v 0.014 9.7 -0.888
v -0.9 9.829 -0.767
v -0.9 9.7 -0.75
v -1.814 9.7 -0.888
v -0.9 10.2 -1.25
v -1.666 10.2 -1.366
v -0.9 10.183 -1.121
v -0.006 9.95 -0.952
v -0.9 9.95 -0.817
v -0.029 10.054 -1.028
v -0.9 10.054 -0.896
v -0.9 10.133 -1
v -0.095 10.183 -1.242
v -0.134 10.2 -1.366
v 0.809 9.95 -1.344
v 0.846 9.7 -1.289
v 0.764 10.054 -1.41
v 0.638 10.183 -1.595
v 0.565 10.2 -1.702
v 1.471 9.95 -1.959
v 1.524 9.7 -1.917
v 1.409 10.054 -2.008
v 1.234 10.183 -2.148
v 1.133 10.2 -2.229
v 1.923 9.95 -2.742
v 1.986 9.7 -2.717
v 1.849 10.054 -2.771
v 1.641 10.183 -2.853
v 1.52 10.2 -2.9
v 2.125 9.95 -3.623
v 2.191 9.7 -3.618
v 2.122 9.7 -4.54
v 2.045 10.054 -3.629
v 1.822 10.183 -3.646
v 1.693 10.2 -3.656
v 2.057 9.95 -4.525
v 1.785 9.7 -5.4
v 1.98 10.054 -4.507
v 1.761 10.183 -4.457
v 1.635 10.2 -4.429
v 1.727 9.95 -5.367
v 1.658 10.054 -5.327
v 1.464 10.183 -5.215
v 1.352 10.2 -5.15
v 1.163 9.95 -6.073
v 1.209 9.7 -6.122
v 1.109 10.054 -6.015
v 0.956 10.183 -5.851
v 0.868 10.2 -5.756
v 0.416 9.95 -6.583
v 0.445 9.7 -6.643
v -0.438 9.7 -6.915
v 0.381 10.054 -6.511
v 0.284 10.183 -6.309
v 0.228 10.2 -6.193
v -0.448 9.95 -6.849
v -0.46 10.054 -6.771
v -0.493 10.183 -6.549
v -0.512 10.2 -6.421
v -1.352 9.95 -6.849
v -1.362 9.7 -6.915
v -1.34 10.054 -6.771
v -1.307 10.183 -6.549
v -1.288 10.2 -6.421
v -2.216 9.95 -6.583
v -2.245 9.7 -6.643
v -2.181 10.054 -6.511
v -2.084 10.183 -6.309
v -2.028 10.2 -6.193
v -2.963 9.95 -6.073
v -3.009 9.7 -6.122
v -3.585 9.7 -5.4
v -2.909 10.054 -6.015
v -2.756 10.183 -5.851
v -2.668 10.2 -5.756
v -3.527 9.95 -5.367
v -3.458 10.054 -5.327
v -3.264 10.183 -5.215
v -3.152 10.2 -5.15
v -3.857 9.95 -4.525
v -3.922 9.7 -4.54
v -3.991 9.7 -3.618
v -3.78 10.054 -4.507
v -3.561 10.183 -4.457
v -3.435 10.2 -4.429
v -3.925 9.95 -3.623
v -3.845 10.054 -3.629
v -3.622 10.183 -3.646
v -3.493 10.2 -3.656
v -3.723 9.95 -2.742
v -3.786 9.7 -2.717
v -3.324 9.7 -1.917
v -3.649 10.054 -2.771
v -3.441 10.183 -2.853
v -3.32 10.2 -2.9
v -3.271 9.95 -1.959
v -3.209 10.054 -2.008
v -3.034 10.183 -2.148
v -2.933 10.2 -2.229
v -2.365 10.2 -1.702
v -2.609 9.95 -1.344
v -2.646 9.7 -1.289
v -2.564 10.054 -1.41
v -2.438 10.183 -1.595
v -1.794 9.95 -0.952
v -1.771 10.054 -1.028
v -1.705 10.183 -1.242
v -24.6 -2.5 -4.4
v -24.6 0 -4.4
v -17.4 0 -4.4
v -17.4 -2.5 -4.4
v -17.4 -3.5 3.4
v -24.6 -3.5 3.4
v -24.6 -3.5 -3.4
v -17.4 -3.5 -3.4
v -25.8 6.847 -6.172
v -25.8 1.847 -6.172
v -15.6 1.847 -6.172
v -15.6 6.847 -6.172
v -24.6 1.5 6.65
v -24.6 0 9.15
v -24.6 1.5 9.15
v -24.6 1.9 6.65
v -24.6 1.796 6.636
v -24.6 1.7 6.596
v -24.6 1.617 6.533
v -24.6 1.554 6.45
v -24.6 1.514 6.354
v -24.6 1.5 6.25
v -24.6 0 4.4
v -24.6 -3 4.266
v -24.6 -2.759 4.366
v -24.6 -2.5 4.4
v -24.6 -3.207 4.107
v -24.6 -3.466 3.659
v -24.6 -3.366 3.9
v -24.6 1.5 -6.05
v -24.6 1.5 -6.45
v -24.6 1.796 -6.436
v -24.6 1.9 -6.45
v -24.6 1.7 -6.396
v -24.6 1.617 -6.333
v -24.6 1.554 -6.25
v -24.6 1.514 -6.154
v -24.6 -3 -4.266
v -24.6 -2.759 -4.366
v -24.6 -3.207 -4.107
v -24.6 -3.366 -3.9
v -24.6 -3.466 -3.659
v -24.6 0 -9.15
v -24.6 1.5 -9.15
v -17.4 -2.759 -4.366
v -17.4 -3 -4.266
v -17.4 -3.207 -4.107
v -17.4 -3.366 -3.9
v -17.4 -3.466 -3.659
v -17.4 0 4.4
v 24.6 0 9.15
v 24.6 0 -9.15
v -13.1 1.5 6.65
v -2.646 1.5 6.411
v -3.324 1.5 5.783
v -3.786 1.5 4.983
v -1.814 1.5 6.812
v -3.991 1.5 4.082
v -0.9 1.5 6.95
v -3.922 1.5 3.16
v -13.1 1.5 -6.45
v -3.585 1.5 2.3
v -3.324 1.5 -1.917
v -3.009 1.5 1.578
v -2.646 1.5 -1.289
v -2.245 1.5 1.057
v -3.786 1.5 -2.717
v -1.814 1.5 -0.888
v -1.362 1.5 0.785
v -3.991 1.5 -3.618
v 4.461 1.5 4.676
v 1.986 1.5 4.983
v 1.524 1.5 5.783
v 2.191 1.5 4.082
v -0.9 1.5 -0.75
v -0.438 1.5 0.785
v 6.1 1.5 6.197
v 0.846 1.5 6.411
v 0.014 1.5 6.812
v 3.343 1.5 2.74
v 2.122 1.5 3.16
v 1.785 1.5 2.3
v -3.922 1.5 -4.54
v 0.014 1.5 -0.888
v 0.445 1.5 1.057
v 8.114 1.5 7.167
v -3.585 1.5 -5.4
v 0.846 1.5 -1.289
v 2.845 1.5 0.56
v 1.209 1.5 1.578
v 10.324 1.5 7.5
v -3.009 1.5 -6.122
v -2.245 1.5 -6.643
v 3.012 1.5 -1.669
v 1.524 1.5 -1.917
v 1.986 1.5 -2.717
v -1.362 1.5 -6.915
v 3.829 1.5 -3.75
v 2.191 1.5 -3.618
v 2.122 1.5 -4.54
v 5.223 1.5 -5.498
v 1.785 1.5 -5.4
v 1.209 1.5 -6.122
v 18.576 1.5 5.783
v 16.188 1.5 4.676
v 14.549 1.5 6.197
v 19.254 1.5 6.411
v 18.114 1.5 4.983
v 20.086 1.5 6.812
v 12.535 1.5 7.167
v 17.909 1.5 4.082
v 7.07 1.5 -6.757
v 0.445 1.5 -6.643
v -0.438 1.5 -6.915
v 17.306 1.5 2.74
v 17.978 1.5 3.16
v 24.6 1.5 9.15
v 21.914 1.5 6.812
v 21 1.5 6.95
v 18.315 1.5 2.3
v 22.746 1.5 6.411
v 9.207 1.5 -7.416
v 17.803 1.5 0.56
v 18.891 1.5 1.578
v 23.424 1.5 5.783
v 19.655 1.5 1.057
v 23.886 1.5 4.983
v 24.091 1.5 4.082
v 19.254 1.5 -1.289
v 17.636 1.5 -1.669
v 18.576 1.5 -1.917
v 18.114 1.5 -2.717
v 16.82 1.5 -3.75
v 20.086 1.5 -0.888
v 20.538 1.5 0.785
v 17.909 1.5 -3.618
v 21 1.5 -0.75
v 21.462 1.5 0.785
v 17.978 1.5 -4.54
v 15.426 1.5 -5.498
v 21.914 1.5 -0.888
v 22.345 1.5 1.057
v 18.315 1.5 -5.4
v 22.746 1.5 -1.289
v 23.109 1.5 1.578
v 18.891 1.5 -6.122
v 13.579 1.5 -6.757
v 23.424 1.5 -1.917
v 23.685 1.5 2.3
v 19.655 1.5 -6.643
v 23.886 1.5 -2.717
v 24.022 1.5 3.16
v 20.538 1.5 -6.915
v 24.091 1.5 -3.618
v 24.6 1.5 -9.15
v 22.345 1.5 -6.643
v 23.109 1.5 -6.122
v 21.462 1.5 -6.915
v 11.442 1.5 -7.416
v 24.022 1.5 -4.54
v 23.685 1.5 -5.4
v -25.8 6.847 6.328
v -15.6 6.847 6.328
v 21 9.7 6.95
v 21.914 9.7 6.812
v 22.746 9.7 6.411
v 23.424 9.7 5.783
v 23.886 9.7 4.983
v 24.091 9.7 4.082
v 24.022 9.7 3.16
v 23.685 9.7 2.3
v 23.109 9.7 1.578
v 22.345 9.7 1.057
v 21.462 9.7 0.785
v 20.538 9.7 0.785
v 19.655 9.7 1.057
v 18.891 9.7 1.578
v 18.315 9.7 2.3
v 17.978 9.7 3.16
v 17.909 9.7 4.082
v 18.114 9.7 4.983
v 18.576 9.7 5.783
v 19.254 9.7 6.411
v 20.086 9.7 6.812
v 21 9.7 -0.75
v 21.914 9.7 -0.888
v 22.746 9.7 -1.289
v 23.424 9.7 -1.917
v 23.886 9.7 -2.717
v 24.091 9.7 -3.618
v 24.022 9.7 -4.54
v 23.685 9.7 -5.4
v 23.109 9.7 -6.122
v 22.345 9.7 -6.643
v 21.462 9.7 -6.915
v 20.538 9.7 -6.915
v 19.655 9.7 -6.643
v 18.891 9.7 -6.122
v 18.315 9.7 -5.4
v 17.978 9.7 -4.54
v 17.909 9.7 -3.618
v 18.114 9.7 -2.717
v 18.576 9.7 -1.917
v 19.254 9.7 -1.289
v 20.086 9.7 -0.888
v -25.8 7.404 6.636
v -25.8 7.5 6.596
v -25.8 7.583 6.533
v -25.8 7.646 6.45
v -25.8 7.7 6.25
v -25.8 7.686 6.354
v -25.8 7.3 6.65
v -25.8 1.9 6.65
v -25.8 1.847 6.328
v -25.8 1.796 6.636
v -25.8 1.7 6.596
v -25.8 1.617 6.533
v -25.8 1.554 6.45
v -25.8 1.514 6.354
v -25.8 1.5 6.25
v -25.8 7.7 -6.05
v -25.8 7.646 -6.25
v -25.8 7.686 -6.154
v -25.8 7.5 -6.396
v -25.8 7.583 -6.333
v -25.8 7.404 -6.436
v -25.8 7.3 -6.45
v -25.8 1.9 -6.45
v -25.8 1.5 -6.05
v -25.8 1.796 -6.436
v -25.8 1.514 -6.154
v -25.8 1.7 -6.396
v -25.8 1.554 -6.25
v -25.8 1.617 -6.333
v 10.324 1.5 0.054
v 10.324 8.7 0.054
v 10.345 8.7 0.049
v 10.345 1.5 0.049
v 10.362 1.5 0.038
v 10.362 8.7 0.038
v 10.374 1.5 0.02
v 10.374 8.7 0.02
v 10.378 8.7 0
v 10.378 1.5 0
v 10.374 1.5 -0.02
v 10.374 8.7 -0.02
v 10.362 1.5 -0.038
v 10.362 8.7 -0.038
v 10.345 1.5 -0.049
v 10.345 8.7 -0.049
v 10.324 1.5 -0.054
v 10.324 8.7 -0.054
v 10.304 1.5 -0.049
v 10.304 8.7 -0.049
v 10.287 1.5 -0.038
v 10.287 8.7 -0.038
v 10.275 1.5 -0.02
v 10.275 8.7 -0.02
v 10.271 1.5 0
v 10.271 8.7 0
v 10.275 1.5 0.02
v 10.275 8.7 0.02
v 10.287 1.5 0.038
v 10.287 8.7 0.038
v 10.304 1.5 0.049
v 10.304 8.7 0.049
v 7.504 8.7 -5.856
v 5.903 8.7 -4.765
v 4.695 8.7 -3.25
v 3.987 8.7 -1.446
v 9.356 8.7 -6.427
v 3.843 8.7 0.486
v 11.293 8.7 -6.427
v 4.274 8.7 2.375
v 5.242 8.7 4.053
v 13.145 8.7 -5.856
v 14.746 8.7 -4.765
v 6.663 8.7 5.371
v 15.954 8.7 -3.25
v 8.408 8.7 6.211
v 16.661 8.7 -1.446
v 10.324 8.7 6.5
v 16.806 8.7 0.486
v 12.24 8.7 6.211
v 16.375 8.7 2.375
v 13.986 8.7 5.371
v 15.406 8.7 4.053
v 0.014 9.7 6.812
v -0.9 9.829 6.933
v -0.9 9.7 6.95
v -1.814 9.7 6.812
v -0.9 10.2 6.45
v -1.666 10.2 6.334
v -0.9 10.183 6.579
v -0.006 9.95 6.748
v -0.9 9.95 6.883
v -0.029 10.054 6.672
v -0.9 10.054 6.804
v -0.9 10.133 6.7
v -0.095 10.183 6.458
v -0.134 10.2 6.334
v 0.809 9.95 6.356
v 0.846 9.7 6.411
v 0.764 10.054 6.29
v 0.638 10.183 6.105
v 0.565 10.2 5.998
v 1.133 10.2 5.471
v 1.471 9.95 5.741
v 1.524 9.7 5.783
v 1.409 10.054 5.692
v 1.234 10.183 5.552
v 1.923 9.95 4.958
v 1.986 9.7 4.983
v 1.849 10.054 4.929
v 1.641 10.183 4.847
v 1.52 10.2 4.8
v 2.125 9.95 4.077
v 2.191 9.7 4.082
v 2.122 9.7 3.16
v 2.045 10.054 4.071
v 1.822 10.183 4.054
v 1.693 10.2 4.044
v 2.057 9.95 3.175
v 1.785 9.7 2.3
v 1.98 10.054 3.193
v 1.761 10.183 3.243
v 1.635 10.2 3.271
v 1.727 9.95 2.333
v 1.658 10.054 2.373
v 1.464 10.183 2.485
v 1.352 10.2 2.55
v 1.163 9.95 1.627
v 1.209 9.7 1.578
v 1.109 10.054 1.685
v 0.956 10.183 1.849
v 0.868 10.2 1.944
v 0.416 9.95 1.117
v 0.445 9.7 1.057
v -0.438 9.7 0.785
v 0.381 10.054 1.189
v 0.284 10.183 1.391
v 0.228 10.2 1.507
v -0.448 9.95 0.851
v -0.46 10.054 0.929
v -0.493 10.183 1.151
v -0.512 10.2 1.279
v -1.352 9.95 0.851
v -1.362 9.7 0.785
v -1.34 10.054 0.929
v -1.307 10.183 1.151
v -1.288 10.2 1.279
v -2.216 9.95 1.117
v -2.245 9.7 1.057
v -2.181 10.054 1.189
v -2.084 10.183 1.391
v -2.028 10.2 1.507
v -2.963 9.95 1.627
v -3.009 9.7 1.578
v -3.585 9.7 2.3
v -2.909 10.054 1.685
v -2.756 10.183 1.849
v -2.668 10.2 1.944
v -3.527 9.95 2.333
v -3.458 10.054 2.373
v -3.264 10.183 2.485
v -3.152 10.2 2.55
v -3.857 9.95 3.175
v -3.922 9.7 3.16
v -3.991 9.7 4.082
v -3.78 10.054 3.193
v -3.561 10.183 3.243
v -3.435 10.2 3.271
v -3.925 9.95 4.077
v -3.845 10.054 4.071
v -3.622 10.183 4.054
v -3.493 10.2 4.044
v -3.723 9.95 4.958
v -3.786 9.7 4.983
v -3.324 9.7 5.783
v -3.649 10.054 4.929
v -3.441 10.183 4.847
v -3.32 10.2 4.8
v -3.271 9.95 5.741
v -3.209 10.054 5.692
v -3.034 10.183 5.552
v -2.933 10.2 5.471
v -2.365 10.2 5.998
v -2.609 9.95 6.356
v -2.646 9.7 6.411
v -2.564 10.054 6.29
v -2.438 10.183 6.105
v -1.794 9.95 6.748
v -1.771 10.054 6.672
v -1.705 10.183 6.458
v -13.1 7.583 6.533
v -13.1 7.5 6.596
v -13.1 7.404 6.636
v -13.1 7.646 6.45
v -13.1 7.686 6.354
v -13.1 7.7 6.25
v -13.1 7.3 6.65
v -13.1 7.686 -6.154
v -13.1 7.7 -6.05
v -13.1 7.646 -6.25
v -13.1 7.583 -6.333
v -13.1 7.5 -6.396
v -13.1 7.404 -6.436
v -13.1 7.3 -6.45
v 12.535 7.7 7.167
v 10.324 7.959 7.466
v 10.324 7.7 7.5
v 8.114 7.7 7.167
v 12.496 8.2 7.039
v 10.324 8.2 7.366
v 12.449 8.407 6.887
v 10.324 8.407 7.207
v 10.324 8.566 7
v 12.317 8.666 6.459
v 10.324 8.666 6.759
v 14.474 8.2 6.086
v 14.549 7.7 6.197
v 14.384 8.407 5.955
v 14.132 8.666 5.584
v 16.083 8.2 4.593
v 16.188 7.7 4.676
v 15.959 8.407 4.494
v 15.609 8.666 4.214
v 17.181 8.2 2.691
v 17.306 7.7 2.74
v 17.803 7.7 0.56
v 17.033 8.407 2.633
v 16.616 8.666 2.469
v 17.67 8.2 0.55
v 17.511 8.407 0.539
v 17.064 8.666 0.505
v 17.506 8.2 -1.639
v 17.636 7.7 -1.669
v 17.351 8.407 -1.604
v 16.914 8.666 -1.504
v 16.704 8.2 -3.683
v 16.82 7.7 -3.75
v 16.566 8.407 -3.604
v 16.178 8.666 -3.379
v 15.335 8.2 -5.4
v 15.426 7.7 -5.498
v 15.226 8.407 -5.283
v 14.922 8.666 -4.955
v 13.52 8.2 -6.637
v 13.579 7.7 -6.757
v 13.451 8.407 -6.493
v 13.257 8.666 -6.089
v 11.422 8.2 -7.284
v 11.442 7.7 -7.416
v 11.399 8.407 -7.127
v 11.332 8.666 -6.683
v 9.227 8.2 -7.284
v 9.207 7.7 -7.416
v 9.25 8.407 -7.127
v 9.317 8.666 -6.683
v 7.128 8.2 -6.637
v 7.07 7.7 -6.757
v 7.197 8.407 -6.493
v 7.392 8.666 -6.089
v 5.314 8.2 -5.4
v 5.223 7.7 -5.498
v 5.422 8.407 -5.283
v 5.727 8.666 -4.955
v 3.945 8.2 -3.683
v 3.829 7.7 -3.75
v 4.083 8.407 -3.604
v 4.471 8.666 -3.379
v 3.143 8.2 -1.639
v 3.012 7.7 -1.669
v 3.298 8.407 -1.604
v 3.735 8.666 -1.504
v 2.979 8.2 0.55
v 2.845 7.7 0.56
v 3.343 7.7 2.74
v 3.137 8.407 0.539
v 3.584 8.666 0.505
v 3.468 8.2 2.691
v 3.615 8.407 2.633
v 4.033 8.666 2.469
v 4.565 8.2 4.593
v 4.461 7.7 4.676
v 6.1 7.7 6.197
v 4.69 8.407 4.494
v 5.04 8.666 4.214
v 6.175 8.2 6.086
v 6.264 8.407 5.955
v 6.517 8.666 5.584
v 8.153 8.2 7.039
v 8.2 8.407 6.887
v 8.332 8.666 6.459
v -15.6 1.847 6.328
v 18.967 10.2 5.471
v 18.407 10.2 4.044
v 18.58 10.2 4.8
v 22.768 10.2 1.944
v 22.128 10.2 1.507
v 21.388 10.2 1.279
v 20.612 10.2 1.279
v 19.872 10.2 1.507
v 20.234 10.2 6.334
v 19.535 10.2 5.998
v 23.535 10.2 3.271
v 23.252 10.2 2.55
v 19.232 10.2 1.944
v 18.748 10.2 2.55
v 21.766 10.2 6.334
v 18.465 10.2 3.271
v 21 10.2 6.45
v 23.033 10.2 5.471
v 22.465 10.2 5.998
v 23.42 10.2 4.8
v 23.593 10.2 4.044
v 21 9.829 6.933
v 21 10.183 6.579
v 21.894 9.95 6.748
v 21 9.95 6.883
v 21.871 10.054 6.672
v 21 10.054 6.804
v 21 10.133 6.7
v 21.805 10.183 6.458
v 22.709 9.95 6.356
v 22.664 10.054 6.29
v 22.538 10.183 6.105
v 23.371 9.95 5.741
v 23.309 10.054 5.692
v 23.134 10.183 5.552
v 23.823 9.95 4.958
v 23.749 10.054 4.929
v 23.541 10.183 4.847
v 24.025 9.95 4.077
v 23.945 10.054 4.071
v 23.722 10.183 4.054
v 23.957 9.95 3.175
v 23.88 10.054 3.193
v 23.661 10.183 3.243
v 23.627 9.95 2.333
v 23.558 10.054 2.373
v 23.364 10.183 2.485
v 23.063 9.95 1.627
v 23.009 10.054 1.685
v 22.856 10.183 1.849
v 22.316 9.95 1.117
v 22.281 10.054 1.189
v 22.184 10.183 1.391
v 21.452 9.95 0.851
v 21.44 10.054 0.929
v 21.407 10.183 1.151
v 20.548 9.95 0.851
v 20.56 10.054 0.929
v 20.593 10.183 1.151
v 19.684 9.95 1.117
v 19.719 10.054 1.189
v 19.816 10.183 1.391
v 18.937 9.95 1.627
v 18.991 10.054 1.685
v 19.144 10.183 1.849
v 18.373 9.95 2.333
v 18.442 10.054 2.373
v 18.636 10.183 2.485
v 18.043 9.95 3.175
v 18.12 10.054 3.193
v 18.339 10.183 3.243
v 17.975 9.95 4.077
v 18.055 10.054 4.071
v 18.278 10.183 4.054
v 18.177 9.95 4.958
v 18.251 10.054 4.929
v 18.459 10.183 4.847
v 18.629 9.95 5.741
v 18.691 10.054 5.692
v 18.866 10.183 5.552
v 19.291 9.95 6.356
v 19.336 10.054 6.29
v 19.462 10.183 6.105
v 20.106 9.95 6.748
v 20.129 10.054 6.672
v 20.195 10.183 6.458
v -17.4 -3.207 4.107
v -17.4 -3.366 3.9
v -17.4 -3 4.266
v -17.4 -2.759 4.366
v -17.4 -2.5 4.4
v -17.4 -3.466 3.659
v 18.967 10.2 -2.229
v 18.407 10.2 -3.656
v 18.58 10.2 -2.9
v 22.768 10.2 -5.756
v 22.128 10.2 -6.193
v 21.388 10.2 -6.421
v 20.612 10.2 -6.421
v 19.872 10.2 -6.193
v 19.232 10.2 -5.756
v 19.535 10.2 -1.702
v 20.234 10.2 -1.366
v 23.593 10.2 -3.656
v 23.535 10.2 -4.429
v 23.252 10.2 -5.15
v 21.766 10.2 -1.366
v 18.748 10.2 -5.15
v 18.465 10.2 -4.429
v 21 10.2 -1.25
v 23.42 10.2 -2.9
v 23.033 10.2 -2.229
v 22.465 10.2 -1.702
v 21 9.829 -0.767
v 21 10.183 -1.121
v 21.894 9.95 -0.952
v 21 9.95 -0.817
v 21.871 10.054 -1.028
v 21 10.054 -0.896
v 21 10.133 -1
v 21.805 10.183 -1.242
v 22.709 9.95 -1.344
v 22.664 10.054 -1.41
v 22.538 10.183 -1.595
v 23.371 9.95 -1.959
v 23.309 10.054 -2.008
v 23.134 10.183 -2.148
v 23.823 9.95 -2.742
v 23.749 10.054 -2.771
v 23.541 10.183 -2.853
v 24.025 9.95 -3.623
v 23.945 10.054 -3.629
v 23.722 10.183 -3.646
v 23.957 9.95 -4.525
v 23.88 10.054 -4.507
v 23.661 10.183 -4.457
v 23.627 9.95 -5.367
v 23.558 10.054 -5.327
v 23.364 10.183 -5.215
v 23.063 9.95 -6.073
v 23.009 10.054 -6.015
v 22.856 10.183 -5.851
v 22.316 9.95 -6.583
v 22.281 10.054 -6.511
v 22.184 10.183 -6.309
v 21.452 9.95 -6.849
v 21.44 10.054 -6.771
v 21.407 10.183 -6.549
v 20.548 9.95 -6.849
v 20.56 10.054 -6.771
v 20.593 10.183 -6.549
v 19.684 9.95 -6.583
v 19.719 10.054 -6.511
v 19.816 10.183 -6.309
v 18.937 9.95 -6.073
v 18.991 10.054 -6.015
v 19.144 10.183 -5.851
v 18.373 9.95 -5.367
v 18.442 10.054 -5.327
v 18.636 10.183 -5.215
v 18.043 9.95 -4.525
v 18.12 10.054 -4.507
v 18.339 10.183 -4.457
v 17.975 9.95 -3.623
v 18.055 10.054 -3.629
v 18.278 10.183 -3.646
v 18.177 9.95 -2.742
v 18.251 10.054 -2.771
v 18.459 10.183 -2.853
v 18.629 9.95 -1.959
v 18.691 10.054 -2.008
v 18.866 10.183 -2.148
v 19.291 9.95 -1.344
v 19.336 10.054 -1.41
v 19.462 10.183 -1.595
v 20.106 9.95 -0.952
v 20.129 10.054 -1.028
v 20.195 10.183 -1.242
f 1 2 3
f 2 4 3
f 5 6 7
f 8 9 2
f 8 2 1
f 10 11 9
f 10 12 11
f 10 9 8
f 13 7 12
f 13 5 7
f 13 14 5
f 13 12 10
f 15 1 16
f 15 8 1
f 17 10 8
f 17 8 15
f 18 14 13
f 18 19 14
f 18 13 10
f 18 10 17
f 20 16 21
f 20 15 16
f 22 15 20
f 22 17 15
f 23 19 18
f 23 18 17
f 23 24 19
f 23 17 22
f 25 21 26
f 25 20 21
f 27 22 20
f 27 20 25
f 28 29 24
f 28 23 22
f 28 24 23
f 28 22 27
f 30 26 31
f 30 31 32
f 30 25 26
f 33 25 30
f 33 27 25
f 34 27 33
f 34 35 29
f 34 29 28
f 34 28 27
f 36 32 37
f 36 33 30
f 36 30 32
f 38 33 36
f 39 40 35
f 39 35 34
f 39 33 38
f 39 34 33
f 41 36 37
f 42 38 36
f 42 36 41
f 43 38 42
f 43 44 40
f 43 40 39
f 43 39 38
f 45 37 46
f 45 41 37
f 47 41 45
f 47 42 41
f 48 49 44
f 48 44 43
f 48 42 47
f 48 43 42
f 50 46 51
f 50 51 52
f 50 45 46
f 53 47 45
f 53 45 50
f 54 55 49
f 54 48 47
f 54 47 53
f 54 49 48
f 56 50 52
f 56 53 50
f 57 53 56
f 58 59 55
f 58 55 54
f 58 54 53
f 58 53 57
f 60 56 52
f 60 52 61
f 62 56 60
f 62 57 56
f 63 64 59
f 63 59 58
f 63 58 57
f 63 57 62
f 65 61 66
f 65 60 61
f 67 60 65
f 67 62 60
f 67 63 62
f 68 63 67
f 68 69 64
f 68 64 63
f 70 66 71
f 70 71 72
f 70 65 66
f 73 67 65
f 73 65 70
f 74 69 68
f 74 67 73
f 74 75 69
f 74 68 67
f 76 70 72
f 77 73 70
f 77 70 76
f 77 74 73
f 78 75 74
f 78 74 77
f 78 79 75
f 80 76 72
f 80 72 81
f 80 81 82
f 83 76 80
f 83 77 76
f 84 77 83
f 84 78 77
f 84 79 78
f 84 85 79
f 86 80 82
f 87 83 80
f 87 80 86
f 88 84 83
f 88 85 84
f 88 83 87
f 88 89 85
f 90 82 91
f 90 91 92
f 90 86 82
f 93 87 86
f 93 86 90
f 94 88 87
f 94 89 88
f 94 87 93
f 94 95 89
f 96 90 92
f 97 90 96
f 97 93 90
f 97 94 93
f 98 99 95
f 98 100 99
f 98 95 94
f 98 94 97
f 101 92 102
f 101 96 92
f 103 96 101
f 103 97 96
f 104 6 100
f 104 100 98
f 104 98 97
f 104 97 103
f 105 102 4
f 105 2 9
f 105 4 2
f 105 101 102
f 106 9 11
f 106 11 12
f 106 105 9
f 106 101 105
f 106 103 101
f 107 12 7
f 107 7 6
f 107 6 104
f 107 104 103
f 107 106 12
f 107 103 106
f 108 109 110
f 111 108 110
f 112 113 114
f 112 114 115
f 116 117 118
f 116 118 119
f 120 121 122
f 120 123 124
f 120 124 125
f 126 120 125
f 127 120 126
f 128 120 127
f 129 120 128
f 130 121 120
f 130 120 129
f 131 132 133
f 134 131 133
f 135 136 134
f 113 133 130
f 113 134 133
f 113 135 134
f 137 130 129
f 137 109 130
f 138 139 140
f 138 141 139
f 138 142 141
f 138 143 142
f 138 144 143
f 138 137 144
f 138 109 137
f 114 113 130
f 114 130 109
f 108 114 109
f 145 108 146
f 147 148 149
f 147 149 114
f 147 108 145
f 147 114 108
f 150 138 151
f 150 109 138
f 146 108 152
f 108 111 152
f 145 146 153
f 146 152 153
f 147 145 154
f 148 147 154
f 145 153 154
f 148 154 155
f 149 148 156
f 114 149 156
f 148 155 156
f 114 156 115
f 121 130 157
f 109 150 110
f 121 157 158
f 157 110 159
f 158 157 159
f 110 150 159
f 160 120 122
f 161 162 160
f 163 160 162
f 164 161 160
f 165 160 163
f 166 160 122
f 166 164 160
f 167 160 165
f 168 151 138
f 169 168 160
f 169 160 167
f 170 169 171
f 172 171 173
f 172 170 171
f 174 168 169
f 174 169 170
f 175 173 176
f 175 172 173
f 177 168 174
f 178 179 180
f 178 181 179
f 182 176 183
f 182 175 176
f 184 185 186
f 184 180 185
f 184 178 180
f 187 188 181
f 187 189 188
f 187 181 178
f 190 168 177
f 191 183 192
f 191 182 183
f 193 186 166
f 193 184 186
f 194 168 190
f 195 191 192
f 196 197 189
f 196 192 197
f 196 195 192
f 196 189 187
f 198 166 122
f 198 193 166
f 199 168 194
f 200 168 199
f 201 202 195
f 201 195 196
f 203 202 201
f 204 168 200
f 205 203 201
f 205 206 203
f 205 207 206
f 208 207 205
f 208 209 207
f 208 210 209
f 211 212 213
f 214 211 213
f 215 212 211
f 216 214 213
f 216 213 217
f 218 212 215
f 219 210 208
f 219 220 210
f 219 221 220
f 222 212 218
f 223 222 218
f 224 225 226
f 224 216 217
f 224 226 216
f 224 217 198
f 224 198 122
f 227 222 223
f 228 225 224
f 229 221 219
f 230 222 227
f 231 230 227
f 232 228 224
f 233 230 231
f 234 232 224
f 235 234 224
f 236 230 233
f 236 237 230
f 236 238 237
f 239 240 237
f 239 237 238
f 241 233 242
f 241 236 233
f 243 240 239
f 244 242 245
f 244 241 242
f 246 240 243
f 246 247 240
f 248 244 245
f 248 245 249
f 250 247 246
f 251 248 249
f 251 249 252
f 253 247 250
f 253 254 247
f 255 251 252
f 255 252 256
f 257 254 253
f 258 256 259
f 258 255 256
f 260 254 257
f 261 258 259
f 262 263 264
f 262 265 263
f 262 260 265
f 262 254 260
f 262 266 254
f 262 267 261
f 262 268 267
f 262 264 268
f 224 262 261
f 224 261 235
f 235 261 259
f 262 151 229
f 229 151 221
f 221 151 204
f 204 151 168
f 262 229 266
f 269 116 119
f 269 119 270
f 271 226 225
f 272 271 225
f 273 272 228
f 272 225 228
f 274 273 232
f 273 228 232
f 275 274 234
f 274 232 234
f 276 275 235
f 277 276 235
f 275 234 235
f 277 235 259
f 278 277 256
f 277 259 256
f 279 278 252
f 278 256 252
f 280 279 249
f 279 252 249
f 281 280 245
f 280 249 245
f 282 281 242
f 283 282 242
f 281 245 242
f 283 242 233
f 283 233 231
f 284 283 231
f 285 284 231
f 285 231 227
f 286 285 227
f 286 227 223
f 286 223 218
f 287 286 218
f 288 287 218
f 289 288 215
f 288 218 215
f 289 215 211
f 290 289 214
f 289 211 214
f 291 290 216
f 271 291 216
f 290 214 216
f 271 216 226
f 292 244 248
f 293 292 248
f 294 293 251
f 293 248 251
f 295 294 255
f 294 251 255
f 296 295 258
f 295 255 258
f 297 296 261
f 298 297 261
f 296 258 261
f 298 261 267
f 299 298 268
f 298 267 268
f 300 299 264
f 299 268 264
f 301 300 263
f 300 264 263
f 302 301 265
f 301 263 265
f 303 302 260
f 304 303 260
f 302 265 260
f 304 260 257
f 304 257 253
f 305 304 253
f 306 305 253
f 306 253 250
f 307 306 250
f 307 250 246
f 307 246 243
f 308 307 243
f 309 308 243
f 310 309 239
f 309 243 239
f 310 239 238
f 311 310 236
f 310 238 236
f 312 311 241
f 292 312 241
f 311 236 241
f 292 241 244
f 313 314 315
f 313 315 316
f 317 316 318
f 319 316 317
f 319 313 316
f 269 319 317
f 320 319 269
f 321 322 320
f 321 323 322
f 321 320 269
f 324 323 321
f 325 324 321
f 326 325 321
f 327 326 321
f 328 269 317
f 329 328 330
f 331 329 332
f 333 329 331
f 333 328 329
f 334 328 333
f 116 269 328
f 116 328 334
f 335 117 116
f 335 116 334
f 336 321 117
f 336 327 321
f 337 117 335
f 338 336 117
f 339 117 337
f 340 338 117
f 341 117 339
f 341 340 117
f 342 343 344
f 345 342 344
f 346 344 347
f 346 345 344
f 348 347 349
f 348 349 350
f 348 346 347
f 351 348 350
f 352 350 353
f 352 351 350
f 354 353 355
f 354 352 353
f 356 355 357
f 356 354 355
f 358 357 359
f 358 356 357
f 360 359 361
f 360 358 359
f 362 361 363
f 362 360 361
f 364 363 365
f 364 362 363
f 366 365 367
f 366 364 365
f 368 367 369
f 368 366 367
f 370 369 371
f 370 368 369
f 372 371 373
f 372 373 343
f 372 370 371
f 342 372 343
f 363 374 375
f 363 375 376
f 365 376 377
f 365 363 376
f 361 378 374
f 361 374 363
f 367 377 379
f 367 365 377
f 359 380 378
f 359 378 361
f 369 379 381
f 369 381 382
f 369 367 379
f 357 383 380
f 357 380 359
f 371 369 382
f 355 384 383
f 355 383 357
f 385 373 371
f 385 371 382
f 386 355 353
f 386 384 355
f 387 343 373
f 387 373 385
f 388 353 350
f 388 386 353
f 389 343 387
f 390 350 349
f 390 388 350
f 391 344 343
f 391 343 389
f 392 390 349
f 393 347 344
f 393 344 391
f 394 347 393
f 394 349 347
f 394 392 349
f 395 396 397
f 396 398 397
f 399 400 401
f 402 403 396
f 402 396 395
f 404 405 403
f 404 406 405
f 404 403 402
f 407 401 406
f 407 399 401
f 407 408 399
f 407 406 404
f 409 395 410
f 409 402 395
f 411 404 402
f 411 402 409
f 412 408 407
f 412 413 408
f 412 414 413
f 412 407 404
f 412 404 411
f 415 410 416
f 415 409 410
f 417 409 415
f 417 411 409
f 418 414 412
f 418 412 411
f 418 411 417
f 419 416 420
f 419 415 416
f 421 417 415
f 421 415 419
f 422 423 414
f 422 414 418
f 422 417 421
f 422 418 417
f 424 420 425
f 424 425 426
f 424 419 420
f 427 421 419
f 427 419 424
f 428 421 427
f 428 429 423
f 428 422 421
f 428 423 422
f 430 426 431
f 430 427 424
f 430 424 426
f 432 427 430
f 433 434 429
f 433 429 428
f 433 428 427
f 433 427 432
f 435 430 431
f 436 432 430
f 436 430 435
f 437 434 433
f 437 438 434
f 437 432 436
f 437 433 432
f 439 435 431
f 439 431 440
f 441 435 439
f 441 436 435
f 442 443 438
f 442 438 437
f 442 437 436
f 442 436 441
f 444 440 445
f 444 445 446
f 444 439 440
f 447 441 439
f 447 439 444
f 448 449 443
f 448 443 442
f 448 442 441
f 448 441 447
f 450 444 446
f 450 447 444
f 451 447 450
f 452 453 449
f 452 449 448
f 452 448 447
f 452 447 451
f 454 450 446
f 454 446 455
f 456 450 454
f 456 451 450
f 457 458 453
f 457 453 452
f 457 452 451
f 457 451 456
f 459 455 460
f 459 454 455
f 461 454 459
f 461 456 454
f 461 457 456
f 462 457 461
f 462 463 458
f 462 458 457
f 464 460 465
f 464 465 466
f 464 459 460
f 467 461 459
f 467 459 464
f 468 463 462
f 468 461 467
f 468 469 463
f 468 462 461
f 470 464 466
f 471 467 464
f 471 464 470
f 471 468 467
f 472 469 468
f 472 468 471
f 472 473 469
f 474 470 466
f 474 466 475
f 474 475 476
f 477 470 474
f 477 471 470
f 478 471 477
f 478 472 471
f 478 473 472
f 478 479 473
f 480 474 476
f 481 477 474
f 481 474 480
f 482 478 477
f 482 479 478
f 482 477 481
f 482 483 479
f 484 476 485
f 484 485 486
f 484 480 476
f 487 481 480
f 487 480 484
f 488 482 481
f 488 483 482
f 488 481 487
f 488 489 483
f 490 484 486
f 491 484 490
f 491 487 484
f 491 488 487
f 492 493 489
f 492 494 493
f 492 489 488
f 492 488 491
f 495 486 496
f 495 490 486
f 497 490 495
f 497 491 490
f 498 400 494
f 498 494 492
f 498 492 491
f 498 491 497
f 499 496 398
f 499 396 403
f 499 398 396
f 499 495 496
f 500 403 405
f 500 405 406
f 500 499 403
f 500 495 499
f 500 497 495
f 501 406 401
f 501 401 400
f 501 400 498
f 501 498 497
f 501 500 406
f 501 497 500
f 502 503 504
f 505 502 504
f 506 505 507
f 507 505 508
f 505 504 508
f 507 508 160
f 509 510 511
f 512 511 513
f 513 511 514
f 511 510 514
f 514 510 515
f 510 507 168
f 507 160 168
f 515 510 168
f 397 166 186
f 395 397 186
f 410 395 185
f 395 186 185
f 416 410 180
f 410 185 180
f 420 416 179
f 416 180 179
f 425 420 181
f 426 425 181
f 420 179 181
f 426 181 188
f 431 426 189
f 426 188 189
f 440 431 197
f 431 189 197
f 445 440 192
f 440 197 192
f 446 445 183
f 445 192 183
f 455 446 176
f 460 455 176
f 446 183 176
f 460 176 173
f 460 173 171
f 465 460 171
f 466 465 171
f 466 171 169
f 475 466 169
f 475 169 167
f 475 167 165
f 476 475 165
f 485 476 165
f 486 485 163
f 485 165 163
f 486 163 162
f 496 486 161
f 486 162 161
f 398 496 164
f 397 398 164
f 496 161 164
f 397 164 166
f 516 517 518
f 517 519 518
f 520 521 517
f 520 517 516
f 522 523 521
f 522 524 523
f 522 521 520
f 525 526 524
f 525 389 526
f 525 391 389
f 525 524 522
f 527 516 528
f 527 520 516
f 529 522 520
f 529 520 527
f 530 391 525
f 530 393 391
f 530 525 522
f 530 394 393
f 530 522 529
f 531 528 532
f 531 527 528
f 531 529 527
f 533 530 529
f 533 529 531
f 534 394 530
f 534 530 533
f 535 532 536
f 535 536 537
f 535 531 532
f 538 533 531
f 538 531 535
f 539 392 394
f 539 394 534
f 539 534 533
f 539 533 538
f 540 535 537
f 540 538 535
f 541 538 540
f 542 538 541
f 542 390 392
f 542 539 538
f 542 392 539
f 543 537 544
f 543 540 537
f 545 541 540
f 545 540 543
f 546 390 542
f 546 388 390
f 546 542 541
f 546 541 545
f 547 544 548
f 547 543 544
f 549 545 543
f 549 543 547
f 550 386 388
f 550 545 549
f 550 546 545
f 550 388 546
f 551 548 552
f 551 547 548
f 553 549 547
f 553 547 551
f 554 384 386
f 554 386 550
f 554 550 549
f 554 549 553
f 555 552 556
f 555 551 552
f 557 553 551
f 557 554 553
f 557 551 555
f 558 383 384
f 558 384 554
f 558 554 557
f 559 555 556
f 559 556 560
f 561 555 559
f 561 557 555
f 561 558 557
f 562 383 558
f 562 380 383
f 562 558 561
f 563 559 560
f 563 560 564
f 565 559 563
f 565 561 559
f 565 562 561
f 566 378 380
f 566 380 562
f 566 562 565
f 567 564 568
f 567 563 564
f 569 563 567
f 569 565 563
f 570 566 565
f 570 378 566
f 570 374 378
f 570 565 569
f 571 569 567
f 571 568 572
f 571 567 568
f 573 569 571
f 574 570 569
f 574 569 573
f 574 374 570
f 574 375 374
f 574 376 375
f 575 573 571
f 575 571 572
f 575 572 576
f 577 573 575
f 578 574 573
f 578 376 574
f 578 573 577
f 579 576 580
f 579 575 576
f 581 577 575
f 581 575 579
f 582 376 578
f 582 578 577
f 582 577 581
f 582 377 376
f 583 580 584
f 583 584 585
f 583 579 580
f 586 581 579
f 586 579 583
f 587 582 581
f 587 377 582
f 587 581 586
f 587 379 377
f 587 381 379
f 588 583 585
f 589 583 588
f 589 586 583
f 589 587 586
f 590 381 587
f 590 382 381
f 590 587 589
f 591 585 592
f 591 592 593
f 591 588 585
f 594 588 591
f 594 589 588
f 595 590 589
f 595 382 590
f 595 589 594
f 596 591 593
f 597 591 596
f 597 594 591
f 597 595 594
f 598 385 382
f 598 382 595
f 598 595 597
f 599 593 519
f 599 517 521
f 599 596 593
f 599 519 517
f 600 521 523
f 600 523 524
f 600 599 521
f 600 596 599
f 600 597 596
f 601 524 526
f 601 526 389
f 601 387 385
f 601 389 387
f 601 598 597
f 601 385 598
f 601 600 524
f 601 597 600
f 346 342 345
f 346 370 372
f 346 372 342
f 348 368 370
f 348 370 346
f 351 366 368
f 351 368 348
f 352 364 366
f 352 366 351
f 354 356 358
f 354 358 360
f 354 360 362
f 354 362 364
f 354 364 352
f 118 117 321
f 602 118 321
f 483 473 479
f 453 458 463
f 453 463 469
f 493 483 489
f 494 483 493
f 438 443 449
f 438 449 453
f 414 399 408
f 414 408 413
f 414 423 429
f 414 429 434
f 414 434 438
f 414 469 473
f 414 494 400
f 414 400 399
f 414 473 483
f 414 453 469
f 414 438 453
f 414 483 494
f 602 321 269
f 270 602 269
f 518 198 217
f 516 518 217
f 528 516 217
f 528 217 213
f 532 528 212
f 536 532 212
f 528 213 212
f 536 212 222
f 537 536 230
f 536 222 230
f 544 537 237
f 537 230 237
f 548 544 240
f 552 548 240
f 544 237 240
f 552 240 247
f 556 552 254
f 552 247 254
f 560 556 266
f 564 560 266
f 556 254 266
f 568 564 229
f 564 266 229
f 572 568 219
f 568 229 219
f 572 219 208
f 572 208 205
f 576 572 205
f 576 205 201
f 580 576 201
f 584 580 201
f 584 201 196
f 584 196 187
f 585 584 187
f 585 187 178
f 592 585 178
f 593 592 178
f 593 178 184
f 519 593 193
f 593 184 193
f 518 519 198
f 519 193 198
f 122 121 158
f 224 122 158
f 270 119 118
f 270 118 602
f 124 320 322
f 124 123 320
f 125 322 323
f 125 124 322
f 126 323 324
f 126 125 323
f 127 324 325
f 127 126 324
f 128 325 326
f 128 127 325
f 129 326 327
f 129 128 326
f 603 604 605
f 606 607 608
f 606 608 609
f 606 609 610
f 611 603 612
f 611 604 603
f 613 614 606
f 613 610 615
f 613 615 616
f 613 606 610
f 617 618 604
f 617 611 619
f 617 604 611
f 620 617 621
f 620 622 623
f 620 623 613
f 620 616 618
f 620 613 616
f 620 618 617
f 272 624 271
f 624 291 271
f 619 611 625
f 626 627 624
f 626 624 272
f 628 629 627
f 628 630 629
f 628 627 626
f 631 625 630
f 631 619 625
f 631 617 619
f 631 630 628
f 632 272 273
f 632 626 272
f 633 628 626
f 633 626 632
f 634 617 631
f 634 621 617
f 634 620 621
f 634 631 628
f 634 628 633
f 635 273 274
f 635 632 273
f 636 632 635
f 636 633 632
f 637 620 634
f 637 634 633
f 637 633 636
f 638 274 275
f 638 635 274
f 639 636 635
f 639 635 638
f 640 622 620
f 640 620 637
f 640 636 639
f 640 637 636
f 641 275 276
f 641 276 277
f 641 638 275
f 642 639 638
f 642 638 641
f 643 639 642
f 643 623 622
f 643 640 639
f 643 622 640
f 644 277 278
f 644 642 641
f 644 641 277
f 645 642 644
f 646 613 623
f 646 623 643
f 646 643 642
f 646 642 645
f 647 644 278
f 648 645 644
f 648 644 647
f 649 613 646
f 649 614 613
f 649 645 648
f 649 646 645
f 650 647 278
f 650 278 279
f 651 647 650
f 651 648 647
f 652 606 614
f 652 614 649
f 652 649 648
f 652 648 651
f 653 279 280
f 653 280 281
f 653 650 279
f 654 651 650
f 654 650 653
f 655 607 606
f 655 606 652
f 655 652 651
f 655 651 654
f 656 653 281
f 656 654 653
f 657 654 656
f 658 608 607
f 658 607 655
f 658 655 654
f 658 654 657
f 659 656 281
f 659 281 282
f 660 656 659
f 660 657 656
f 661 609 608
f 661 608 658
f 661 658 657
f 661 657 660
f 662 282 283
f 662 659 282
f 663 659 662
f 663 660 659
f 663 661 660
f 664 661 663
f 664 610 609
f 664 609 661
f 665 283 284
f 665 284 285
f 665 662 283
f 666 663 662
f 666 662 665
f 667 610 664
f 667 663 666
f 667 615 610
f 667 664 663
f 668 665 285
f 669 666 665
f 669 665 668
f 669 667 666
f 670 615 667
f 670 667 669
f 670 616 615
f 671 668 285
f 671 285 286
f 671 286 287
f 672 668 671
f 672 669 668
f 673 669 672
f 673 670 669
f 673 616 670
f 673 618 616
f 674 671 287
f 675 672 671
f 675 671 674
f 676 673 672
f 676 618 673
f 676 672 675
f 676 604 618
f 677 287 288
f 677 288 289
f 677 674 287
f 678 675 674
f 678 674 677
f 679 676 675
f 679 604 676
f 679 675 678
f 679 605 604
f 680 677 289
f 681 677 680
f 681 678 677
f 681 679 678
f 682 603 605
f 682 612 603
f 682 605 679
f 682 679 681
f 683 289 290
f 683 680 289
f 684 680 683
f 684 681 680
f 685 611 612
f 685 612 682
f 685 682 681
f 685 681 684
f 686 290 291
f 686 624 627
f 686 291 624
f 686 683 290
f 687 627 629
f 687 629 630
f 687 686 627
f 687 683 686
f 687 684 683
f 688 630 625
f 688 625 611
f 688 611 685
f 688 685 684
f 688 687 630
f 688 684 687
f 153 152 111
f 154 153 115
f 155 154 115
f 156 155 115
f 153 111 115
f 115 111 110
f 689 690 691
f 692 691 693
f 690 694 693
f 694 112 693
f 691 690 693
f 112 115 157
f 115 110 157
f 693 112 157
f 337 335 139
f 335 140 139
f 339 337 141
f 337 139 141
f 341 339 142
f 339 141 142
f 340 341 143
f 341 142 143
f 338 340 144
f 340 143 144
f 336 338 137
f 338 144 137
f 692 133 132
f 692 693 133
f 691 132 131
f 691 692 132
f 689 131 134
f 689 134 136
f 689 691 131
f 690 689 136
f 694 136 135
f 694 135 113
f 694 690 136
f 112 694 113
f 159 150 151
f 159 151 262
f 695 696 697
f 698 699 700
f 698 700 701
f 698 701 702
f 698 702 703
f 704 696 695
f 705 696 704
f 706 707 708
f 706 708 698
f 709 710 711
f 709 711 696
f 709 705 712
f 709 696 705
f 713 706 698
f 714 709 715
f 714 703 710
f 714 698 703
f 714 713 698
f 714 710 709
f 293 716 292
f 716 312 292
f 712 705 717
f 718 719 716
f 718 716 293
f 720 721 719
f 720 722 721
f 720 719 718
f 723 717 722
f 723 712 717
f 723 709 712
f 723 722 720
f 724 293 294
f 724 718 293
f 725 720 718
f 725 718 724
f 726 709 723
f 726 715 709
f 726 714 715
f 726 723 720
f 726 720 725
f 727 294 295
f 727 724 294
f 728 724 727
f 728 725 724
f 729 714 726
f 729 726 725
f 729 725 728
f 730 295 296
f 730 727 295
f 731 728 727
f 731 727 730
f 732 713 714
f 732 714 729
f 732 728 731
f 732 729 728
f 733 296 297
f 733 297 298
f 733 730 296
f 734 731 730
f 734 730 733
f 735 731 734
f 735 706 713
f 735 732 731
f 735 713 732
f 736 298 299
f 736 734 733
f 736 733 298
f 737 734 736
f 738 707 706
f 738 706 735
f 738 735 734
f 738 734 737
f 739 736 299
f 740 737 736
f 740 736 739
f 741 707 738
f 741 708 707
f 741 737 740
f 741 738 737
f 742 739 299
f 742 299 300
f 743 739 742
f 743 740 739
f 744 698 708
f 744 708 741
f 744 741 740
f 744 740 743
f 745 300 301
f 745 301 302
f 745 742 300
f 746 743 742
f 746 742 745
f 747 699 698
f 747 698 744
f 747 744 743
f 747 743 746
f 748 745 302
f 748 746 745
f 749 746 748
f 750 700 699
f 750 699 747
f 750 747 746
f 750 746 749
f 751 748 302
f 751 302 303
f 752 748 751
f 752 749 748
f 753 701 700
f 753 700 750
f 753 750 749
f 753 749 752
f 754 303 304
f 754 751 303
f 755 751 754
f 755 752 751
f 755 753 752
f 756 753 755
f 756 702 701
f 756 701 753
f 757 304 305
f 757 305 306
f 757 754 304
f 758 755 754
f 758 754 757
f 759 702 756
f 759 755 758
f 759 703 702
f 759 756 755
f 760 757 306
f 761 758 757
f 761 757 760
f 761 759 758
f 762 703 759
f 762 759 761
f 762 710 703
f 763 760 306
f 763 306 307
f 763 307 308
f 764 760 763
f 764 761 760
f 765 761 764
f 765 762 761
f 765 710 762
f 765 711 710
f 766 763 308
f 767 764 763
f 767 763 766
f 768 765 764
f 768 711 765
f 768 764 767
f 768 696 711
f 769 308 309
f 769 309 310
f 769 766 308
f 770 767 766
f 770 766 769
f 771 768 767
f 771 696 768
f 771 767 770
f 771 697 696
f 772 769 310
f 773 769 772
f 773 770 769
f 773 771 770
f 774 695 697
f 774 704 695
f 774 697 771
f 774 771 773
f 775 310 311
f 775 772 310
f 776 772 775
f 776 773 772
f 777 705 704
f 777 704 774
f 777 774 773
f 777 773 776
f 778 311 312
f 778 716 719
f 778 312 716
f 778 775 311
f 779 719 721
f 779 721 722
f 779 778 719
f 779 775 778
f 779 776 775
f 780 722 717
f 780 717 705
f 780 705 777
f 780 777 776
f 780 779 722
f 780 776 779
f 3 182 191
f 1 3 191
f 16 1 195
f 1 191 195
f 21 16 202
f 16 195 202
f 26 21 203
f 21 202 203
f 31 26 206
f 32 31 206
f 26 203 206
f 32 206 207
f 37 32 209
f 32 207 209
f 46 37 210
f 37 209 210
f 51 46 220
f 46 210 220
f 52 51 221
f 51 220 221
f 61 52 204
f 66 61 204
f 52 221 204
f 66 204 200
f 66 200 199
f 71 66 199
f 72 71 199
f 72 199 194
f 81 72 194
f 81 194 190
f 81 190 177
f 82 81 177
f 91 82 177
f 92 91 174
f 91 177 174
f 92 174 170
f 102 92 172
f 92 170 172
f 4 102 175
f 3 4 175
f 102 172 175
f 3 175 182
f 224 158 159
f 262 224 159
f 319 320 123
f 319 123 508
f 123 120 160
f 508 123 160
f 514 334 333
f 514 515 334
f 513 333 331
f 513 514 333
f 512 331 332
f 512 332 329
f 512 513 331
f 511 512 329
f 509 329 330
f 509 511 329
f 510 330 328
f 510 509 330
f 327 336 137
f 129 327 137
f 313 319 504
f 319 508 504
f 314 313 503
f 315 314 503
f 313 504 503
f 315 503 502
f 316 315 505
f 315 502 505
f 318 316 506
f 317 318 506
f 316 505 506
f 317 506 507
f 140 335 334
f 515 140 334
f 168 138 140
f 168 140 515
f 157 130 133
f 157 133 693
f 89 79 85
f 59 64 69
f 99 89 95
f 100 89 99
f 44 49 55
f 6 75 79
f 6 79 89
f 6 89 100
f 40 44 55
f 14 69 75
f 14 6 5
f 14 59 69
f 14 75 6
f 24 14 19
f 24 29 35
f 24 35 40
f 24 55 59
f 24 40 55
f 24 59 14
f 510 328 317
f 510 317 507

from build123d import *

# Parameters (mm, degrees)
SKETCH_1_W          = 49.2
SKETCH_1_H          = 18.3
EXTRUDE_361_DEPTH   = 1.5
SKETCH_3_W          = 12.7
SKETCH_3_H          = 13.1
EXTRUDE_2_DEPTH     = 6.2
SKETCH_4_W          = 7.2
SKETCH_4_H          = 8.8
EXTRUDE_3_DEPTH     = 3.5
FILLET_2_R          = 1
FILLET_3_R          = 0.4
SKETCH_5_R          = 3.1
EXTRUDE_4_DEPTH     = 8.7
FILLET_5_R          = 0.5
SKETCH_6_R          = 7.5
SKETCH_6_R_2        = 0.053550992
EXTRUDE_5_DEPTH     = 7.2
FILLET_6_R          = 1
SKETCH_7_W          = 12.5
SKETCH_7_H          = 5
CUT_EXTRUDE_1_DEPTH = 10.2
FILLET_7_R          = 0.4


with BuildPart() as part:
    # Эскиз1 → Extrude 361 (new body)
    with BuildSketch(Plane(origin=(0, 0, 0), x_dir=(1, 0, 0), z_dir=(0, 1, 0))):
        Rectangle(SKETCH_1_W, SKETCH_1_H)
    extrude(amount=EXTRUDE_361_DEPTH)

    # Эскиз3 → Бобышка-Вытянуть2 (add)
    with BuildSketch(Plane(origin=(0, 1.5, 0), x_dir=(1, 0, 0), z_dir=(0, 1, 0))):
        with Locations((-19.45, -0.1)):
            Rectangle(SKETCH_3_W, SKETCH_3_H)
    extrude(amount=EXTRUDE_2_DEPTH)

    # Эскиз4 → Бобышка-Вытянуть3 (add)
    with BuildSketch(Plane.XZ):
        with Locations((-21, 0)):
            Rectangle(SKETCH_4_W, SKETCH_4_H)
    extrude(amount=EXTRUDE_3_DEPTH)

    # Скругление2
    fillet_2_edges = [part.edges().sort_by_distance(p)[0] for p in [
        (-21, -3.5, 4.4),
        (-21, -3.5, -4.4),
    ]]
    fillet(fillet_2_edges, radius=FILLET_2_R)

    # Скругление3
    fillet_3_edges = [part.edges().sort_by_distance(p)[0] for p in [
        (-19.45, 7.7, -6.45),
        (-19.45, 7.7, 6.65),
    ]]
    fillet(fillet_3_edges, radius=FILLET_3_R)

    # Эскиз5 → Бобышка-Вытянуть4 (add)
    with BuildSketch(Plane(origin=(0, 1.5, 0), x_dir=(1, 0, 0), z_dir=(0, 1, 0))):
        with Locations(Location((21, 3.85, 0), (0, 0, 270))):
            Circle(SKETCH_5_R)
        with Locations(Location((21, -3.85, 0), (0, 0, 270))):
            Circle(SKETCH_5_R)
        with Locations(Location((-0.9, -3.85, 0), (0, 0, 270))):
            Circle(SKETCH_5_R)
        with Locations(Location((-0.9, 3.85, 0), (0, 0, 270))):
            Circle(SKETCH_5_R)
    extrude(amount=EXTRUDE_4_DEPTH)

    # Скругление5
    fillet_5_edges = [part.edges().sort_by_distance(p)[0] for p in [
        (21, 10.2, -6.95),
        (21, 10.2, 0.75),
        (-0.9, 10.2, 0.75),
        (-0.9, 10.2, -6.95),
    ]]
    fillet(fillet_5_edges, radius=FILLET_5_R)

    # Эскиз6 → Бобышка-Вытянуть5 (add)
    with BuildSketch(Plane(origin=(0, 1.5, 0), x_dir=(1, 0, 0), z_dir=(0, 1, 0))):
        with Locations(Location((10.324402455, 0, 0), (0, 0, 270))):
            Circle(SKETCH_6_R)
        with Locations(Location((10.324402455, 0, 0), (0, 0, 270))):
            Circle(SKETCH_6_R_2, mode=Mode.SUBTRACT)
    extrude(amount=EXTRUDE_5_DEPTH)

    # Скругление6
    fillet_6_edges = [part.edges().sort_by_distance(p)[0] for p in [
        (10.324402455, 8.7, -7.5),
    ]]
    fillet(fillet_6_edges, radius=FILLET_6_R)

    # Эскиз7 → Вырез-Вытянуть1 (cut)
    with BuildSketch(Plane.ZY.offset(25.8)):
        with Locations((0.078486032, 4.347326387)):
            Rectangle(SKETCH_7_W, SKETCH_7_H)
    extrude(amount=-CUT_EXTRUDE_1_DEPTH, mode=Mode.SUBTRACT)

    # Скругление7
    fillet_7_edges = [part.edges().sort_by_distance(p)[0] for p in [
        (-25.2, 1.5, -6.45),
        (-25.2, 1.5, 6.65),
    ]]
    fillet(fillet_7_edges, radius=FILLET_7_R)


solid = part.part
